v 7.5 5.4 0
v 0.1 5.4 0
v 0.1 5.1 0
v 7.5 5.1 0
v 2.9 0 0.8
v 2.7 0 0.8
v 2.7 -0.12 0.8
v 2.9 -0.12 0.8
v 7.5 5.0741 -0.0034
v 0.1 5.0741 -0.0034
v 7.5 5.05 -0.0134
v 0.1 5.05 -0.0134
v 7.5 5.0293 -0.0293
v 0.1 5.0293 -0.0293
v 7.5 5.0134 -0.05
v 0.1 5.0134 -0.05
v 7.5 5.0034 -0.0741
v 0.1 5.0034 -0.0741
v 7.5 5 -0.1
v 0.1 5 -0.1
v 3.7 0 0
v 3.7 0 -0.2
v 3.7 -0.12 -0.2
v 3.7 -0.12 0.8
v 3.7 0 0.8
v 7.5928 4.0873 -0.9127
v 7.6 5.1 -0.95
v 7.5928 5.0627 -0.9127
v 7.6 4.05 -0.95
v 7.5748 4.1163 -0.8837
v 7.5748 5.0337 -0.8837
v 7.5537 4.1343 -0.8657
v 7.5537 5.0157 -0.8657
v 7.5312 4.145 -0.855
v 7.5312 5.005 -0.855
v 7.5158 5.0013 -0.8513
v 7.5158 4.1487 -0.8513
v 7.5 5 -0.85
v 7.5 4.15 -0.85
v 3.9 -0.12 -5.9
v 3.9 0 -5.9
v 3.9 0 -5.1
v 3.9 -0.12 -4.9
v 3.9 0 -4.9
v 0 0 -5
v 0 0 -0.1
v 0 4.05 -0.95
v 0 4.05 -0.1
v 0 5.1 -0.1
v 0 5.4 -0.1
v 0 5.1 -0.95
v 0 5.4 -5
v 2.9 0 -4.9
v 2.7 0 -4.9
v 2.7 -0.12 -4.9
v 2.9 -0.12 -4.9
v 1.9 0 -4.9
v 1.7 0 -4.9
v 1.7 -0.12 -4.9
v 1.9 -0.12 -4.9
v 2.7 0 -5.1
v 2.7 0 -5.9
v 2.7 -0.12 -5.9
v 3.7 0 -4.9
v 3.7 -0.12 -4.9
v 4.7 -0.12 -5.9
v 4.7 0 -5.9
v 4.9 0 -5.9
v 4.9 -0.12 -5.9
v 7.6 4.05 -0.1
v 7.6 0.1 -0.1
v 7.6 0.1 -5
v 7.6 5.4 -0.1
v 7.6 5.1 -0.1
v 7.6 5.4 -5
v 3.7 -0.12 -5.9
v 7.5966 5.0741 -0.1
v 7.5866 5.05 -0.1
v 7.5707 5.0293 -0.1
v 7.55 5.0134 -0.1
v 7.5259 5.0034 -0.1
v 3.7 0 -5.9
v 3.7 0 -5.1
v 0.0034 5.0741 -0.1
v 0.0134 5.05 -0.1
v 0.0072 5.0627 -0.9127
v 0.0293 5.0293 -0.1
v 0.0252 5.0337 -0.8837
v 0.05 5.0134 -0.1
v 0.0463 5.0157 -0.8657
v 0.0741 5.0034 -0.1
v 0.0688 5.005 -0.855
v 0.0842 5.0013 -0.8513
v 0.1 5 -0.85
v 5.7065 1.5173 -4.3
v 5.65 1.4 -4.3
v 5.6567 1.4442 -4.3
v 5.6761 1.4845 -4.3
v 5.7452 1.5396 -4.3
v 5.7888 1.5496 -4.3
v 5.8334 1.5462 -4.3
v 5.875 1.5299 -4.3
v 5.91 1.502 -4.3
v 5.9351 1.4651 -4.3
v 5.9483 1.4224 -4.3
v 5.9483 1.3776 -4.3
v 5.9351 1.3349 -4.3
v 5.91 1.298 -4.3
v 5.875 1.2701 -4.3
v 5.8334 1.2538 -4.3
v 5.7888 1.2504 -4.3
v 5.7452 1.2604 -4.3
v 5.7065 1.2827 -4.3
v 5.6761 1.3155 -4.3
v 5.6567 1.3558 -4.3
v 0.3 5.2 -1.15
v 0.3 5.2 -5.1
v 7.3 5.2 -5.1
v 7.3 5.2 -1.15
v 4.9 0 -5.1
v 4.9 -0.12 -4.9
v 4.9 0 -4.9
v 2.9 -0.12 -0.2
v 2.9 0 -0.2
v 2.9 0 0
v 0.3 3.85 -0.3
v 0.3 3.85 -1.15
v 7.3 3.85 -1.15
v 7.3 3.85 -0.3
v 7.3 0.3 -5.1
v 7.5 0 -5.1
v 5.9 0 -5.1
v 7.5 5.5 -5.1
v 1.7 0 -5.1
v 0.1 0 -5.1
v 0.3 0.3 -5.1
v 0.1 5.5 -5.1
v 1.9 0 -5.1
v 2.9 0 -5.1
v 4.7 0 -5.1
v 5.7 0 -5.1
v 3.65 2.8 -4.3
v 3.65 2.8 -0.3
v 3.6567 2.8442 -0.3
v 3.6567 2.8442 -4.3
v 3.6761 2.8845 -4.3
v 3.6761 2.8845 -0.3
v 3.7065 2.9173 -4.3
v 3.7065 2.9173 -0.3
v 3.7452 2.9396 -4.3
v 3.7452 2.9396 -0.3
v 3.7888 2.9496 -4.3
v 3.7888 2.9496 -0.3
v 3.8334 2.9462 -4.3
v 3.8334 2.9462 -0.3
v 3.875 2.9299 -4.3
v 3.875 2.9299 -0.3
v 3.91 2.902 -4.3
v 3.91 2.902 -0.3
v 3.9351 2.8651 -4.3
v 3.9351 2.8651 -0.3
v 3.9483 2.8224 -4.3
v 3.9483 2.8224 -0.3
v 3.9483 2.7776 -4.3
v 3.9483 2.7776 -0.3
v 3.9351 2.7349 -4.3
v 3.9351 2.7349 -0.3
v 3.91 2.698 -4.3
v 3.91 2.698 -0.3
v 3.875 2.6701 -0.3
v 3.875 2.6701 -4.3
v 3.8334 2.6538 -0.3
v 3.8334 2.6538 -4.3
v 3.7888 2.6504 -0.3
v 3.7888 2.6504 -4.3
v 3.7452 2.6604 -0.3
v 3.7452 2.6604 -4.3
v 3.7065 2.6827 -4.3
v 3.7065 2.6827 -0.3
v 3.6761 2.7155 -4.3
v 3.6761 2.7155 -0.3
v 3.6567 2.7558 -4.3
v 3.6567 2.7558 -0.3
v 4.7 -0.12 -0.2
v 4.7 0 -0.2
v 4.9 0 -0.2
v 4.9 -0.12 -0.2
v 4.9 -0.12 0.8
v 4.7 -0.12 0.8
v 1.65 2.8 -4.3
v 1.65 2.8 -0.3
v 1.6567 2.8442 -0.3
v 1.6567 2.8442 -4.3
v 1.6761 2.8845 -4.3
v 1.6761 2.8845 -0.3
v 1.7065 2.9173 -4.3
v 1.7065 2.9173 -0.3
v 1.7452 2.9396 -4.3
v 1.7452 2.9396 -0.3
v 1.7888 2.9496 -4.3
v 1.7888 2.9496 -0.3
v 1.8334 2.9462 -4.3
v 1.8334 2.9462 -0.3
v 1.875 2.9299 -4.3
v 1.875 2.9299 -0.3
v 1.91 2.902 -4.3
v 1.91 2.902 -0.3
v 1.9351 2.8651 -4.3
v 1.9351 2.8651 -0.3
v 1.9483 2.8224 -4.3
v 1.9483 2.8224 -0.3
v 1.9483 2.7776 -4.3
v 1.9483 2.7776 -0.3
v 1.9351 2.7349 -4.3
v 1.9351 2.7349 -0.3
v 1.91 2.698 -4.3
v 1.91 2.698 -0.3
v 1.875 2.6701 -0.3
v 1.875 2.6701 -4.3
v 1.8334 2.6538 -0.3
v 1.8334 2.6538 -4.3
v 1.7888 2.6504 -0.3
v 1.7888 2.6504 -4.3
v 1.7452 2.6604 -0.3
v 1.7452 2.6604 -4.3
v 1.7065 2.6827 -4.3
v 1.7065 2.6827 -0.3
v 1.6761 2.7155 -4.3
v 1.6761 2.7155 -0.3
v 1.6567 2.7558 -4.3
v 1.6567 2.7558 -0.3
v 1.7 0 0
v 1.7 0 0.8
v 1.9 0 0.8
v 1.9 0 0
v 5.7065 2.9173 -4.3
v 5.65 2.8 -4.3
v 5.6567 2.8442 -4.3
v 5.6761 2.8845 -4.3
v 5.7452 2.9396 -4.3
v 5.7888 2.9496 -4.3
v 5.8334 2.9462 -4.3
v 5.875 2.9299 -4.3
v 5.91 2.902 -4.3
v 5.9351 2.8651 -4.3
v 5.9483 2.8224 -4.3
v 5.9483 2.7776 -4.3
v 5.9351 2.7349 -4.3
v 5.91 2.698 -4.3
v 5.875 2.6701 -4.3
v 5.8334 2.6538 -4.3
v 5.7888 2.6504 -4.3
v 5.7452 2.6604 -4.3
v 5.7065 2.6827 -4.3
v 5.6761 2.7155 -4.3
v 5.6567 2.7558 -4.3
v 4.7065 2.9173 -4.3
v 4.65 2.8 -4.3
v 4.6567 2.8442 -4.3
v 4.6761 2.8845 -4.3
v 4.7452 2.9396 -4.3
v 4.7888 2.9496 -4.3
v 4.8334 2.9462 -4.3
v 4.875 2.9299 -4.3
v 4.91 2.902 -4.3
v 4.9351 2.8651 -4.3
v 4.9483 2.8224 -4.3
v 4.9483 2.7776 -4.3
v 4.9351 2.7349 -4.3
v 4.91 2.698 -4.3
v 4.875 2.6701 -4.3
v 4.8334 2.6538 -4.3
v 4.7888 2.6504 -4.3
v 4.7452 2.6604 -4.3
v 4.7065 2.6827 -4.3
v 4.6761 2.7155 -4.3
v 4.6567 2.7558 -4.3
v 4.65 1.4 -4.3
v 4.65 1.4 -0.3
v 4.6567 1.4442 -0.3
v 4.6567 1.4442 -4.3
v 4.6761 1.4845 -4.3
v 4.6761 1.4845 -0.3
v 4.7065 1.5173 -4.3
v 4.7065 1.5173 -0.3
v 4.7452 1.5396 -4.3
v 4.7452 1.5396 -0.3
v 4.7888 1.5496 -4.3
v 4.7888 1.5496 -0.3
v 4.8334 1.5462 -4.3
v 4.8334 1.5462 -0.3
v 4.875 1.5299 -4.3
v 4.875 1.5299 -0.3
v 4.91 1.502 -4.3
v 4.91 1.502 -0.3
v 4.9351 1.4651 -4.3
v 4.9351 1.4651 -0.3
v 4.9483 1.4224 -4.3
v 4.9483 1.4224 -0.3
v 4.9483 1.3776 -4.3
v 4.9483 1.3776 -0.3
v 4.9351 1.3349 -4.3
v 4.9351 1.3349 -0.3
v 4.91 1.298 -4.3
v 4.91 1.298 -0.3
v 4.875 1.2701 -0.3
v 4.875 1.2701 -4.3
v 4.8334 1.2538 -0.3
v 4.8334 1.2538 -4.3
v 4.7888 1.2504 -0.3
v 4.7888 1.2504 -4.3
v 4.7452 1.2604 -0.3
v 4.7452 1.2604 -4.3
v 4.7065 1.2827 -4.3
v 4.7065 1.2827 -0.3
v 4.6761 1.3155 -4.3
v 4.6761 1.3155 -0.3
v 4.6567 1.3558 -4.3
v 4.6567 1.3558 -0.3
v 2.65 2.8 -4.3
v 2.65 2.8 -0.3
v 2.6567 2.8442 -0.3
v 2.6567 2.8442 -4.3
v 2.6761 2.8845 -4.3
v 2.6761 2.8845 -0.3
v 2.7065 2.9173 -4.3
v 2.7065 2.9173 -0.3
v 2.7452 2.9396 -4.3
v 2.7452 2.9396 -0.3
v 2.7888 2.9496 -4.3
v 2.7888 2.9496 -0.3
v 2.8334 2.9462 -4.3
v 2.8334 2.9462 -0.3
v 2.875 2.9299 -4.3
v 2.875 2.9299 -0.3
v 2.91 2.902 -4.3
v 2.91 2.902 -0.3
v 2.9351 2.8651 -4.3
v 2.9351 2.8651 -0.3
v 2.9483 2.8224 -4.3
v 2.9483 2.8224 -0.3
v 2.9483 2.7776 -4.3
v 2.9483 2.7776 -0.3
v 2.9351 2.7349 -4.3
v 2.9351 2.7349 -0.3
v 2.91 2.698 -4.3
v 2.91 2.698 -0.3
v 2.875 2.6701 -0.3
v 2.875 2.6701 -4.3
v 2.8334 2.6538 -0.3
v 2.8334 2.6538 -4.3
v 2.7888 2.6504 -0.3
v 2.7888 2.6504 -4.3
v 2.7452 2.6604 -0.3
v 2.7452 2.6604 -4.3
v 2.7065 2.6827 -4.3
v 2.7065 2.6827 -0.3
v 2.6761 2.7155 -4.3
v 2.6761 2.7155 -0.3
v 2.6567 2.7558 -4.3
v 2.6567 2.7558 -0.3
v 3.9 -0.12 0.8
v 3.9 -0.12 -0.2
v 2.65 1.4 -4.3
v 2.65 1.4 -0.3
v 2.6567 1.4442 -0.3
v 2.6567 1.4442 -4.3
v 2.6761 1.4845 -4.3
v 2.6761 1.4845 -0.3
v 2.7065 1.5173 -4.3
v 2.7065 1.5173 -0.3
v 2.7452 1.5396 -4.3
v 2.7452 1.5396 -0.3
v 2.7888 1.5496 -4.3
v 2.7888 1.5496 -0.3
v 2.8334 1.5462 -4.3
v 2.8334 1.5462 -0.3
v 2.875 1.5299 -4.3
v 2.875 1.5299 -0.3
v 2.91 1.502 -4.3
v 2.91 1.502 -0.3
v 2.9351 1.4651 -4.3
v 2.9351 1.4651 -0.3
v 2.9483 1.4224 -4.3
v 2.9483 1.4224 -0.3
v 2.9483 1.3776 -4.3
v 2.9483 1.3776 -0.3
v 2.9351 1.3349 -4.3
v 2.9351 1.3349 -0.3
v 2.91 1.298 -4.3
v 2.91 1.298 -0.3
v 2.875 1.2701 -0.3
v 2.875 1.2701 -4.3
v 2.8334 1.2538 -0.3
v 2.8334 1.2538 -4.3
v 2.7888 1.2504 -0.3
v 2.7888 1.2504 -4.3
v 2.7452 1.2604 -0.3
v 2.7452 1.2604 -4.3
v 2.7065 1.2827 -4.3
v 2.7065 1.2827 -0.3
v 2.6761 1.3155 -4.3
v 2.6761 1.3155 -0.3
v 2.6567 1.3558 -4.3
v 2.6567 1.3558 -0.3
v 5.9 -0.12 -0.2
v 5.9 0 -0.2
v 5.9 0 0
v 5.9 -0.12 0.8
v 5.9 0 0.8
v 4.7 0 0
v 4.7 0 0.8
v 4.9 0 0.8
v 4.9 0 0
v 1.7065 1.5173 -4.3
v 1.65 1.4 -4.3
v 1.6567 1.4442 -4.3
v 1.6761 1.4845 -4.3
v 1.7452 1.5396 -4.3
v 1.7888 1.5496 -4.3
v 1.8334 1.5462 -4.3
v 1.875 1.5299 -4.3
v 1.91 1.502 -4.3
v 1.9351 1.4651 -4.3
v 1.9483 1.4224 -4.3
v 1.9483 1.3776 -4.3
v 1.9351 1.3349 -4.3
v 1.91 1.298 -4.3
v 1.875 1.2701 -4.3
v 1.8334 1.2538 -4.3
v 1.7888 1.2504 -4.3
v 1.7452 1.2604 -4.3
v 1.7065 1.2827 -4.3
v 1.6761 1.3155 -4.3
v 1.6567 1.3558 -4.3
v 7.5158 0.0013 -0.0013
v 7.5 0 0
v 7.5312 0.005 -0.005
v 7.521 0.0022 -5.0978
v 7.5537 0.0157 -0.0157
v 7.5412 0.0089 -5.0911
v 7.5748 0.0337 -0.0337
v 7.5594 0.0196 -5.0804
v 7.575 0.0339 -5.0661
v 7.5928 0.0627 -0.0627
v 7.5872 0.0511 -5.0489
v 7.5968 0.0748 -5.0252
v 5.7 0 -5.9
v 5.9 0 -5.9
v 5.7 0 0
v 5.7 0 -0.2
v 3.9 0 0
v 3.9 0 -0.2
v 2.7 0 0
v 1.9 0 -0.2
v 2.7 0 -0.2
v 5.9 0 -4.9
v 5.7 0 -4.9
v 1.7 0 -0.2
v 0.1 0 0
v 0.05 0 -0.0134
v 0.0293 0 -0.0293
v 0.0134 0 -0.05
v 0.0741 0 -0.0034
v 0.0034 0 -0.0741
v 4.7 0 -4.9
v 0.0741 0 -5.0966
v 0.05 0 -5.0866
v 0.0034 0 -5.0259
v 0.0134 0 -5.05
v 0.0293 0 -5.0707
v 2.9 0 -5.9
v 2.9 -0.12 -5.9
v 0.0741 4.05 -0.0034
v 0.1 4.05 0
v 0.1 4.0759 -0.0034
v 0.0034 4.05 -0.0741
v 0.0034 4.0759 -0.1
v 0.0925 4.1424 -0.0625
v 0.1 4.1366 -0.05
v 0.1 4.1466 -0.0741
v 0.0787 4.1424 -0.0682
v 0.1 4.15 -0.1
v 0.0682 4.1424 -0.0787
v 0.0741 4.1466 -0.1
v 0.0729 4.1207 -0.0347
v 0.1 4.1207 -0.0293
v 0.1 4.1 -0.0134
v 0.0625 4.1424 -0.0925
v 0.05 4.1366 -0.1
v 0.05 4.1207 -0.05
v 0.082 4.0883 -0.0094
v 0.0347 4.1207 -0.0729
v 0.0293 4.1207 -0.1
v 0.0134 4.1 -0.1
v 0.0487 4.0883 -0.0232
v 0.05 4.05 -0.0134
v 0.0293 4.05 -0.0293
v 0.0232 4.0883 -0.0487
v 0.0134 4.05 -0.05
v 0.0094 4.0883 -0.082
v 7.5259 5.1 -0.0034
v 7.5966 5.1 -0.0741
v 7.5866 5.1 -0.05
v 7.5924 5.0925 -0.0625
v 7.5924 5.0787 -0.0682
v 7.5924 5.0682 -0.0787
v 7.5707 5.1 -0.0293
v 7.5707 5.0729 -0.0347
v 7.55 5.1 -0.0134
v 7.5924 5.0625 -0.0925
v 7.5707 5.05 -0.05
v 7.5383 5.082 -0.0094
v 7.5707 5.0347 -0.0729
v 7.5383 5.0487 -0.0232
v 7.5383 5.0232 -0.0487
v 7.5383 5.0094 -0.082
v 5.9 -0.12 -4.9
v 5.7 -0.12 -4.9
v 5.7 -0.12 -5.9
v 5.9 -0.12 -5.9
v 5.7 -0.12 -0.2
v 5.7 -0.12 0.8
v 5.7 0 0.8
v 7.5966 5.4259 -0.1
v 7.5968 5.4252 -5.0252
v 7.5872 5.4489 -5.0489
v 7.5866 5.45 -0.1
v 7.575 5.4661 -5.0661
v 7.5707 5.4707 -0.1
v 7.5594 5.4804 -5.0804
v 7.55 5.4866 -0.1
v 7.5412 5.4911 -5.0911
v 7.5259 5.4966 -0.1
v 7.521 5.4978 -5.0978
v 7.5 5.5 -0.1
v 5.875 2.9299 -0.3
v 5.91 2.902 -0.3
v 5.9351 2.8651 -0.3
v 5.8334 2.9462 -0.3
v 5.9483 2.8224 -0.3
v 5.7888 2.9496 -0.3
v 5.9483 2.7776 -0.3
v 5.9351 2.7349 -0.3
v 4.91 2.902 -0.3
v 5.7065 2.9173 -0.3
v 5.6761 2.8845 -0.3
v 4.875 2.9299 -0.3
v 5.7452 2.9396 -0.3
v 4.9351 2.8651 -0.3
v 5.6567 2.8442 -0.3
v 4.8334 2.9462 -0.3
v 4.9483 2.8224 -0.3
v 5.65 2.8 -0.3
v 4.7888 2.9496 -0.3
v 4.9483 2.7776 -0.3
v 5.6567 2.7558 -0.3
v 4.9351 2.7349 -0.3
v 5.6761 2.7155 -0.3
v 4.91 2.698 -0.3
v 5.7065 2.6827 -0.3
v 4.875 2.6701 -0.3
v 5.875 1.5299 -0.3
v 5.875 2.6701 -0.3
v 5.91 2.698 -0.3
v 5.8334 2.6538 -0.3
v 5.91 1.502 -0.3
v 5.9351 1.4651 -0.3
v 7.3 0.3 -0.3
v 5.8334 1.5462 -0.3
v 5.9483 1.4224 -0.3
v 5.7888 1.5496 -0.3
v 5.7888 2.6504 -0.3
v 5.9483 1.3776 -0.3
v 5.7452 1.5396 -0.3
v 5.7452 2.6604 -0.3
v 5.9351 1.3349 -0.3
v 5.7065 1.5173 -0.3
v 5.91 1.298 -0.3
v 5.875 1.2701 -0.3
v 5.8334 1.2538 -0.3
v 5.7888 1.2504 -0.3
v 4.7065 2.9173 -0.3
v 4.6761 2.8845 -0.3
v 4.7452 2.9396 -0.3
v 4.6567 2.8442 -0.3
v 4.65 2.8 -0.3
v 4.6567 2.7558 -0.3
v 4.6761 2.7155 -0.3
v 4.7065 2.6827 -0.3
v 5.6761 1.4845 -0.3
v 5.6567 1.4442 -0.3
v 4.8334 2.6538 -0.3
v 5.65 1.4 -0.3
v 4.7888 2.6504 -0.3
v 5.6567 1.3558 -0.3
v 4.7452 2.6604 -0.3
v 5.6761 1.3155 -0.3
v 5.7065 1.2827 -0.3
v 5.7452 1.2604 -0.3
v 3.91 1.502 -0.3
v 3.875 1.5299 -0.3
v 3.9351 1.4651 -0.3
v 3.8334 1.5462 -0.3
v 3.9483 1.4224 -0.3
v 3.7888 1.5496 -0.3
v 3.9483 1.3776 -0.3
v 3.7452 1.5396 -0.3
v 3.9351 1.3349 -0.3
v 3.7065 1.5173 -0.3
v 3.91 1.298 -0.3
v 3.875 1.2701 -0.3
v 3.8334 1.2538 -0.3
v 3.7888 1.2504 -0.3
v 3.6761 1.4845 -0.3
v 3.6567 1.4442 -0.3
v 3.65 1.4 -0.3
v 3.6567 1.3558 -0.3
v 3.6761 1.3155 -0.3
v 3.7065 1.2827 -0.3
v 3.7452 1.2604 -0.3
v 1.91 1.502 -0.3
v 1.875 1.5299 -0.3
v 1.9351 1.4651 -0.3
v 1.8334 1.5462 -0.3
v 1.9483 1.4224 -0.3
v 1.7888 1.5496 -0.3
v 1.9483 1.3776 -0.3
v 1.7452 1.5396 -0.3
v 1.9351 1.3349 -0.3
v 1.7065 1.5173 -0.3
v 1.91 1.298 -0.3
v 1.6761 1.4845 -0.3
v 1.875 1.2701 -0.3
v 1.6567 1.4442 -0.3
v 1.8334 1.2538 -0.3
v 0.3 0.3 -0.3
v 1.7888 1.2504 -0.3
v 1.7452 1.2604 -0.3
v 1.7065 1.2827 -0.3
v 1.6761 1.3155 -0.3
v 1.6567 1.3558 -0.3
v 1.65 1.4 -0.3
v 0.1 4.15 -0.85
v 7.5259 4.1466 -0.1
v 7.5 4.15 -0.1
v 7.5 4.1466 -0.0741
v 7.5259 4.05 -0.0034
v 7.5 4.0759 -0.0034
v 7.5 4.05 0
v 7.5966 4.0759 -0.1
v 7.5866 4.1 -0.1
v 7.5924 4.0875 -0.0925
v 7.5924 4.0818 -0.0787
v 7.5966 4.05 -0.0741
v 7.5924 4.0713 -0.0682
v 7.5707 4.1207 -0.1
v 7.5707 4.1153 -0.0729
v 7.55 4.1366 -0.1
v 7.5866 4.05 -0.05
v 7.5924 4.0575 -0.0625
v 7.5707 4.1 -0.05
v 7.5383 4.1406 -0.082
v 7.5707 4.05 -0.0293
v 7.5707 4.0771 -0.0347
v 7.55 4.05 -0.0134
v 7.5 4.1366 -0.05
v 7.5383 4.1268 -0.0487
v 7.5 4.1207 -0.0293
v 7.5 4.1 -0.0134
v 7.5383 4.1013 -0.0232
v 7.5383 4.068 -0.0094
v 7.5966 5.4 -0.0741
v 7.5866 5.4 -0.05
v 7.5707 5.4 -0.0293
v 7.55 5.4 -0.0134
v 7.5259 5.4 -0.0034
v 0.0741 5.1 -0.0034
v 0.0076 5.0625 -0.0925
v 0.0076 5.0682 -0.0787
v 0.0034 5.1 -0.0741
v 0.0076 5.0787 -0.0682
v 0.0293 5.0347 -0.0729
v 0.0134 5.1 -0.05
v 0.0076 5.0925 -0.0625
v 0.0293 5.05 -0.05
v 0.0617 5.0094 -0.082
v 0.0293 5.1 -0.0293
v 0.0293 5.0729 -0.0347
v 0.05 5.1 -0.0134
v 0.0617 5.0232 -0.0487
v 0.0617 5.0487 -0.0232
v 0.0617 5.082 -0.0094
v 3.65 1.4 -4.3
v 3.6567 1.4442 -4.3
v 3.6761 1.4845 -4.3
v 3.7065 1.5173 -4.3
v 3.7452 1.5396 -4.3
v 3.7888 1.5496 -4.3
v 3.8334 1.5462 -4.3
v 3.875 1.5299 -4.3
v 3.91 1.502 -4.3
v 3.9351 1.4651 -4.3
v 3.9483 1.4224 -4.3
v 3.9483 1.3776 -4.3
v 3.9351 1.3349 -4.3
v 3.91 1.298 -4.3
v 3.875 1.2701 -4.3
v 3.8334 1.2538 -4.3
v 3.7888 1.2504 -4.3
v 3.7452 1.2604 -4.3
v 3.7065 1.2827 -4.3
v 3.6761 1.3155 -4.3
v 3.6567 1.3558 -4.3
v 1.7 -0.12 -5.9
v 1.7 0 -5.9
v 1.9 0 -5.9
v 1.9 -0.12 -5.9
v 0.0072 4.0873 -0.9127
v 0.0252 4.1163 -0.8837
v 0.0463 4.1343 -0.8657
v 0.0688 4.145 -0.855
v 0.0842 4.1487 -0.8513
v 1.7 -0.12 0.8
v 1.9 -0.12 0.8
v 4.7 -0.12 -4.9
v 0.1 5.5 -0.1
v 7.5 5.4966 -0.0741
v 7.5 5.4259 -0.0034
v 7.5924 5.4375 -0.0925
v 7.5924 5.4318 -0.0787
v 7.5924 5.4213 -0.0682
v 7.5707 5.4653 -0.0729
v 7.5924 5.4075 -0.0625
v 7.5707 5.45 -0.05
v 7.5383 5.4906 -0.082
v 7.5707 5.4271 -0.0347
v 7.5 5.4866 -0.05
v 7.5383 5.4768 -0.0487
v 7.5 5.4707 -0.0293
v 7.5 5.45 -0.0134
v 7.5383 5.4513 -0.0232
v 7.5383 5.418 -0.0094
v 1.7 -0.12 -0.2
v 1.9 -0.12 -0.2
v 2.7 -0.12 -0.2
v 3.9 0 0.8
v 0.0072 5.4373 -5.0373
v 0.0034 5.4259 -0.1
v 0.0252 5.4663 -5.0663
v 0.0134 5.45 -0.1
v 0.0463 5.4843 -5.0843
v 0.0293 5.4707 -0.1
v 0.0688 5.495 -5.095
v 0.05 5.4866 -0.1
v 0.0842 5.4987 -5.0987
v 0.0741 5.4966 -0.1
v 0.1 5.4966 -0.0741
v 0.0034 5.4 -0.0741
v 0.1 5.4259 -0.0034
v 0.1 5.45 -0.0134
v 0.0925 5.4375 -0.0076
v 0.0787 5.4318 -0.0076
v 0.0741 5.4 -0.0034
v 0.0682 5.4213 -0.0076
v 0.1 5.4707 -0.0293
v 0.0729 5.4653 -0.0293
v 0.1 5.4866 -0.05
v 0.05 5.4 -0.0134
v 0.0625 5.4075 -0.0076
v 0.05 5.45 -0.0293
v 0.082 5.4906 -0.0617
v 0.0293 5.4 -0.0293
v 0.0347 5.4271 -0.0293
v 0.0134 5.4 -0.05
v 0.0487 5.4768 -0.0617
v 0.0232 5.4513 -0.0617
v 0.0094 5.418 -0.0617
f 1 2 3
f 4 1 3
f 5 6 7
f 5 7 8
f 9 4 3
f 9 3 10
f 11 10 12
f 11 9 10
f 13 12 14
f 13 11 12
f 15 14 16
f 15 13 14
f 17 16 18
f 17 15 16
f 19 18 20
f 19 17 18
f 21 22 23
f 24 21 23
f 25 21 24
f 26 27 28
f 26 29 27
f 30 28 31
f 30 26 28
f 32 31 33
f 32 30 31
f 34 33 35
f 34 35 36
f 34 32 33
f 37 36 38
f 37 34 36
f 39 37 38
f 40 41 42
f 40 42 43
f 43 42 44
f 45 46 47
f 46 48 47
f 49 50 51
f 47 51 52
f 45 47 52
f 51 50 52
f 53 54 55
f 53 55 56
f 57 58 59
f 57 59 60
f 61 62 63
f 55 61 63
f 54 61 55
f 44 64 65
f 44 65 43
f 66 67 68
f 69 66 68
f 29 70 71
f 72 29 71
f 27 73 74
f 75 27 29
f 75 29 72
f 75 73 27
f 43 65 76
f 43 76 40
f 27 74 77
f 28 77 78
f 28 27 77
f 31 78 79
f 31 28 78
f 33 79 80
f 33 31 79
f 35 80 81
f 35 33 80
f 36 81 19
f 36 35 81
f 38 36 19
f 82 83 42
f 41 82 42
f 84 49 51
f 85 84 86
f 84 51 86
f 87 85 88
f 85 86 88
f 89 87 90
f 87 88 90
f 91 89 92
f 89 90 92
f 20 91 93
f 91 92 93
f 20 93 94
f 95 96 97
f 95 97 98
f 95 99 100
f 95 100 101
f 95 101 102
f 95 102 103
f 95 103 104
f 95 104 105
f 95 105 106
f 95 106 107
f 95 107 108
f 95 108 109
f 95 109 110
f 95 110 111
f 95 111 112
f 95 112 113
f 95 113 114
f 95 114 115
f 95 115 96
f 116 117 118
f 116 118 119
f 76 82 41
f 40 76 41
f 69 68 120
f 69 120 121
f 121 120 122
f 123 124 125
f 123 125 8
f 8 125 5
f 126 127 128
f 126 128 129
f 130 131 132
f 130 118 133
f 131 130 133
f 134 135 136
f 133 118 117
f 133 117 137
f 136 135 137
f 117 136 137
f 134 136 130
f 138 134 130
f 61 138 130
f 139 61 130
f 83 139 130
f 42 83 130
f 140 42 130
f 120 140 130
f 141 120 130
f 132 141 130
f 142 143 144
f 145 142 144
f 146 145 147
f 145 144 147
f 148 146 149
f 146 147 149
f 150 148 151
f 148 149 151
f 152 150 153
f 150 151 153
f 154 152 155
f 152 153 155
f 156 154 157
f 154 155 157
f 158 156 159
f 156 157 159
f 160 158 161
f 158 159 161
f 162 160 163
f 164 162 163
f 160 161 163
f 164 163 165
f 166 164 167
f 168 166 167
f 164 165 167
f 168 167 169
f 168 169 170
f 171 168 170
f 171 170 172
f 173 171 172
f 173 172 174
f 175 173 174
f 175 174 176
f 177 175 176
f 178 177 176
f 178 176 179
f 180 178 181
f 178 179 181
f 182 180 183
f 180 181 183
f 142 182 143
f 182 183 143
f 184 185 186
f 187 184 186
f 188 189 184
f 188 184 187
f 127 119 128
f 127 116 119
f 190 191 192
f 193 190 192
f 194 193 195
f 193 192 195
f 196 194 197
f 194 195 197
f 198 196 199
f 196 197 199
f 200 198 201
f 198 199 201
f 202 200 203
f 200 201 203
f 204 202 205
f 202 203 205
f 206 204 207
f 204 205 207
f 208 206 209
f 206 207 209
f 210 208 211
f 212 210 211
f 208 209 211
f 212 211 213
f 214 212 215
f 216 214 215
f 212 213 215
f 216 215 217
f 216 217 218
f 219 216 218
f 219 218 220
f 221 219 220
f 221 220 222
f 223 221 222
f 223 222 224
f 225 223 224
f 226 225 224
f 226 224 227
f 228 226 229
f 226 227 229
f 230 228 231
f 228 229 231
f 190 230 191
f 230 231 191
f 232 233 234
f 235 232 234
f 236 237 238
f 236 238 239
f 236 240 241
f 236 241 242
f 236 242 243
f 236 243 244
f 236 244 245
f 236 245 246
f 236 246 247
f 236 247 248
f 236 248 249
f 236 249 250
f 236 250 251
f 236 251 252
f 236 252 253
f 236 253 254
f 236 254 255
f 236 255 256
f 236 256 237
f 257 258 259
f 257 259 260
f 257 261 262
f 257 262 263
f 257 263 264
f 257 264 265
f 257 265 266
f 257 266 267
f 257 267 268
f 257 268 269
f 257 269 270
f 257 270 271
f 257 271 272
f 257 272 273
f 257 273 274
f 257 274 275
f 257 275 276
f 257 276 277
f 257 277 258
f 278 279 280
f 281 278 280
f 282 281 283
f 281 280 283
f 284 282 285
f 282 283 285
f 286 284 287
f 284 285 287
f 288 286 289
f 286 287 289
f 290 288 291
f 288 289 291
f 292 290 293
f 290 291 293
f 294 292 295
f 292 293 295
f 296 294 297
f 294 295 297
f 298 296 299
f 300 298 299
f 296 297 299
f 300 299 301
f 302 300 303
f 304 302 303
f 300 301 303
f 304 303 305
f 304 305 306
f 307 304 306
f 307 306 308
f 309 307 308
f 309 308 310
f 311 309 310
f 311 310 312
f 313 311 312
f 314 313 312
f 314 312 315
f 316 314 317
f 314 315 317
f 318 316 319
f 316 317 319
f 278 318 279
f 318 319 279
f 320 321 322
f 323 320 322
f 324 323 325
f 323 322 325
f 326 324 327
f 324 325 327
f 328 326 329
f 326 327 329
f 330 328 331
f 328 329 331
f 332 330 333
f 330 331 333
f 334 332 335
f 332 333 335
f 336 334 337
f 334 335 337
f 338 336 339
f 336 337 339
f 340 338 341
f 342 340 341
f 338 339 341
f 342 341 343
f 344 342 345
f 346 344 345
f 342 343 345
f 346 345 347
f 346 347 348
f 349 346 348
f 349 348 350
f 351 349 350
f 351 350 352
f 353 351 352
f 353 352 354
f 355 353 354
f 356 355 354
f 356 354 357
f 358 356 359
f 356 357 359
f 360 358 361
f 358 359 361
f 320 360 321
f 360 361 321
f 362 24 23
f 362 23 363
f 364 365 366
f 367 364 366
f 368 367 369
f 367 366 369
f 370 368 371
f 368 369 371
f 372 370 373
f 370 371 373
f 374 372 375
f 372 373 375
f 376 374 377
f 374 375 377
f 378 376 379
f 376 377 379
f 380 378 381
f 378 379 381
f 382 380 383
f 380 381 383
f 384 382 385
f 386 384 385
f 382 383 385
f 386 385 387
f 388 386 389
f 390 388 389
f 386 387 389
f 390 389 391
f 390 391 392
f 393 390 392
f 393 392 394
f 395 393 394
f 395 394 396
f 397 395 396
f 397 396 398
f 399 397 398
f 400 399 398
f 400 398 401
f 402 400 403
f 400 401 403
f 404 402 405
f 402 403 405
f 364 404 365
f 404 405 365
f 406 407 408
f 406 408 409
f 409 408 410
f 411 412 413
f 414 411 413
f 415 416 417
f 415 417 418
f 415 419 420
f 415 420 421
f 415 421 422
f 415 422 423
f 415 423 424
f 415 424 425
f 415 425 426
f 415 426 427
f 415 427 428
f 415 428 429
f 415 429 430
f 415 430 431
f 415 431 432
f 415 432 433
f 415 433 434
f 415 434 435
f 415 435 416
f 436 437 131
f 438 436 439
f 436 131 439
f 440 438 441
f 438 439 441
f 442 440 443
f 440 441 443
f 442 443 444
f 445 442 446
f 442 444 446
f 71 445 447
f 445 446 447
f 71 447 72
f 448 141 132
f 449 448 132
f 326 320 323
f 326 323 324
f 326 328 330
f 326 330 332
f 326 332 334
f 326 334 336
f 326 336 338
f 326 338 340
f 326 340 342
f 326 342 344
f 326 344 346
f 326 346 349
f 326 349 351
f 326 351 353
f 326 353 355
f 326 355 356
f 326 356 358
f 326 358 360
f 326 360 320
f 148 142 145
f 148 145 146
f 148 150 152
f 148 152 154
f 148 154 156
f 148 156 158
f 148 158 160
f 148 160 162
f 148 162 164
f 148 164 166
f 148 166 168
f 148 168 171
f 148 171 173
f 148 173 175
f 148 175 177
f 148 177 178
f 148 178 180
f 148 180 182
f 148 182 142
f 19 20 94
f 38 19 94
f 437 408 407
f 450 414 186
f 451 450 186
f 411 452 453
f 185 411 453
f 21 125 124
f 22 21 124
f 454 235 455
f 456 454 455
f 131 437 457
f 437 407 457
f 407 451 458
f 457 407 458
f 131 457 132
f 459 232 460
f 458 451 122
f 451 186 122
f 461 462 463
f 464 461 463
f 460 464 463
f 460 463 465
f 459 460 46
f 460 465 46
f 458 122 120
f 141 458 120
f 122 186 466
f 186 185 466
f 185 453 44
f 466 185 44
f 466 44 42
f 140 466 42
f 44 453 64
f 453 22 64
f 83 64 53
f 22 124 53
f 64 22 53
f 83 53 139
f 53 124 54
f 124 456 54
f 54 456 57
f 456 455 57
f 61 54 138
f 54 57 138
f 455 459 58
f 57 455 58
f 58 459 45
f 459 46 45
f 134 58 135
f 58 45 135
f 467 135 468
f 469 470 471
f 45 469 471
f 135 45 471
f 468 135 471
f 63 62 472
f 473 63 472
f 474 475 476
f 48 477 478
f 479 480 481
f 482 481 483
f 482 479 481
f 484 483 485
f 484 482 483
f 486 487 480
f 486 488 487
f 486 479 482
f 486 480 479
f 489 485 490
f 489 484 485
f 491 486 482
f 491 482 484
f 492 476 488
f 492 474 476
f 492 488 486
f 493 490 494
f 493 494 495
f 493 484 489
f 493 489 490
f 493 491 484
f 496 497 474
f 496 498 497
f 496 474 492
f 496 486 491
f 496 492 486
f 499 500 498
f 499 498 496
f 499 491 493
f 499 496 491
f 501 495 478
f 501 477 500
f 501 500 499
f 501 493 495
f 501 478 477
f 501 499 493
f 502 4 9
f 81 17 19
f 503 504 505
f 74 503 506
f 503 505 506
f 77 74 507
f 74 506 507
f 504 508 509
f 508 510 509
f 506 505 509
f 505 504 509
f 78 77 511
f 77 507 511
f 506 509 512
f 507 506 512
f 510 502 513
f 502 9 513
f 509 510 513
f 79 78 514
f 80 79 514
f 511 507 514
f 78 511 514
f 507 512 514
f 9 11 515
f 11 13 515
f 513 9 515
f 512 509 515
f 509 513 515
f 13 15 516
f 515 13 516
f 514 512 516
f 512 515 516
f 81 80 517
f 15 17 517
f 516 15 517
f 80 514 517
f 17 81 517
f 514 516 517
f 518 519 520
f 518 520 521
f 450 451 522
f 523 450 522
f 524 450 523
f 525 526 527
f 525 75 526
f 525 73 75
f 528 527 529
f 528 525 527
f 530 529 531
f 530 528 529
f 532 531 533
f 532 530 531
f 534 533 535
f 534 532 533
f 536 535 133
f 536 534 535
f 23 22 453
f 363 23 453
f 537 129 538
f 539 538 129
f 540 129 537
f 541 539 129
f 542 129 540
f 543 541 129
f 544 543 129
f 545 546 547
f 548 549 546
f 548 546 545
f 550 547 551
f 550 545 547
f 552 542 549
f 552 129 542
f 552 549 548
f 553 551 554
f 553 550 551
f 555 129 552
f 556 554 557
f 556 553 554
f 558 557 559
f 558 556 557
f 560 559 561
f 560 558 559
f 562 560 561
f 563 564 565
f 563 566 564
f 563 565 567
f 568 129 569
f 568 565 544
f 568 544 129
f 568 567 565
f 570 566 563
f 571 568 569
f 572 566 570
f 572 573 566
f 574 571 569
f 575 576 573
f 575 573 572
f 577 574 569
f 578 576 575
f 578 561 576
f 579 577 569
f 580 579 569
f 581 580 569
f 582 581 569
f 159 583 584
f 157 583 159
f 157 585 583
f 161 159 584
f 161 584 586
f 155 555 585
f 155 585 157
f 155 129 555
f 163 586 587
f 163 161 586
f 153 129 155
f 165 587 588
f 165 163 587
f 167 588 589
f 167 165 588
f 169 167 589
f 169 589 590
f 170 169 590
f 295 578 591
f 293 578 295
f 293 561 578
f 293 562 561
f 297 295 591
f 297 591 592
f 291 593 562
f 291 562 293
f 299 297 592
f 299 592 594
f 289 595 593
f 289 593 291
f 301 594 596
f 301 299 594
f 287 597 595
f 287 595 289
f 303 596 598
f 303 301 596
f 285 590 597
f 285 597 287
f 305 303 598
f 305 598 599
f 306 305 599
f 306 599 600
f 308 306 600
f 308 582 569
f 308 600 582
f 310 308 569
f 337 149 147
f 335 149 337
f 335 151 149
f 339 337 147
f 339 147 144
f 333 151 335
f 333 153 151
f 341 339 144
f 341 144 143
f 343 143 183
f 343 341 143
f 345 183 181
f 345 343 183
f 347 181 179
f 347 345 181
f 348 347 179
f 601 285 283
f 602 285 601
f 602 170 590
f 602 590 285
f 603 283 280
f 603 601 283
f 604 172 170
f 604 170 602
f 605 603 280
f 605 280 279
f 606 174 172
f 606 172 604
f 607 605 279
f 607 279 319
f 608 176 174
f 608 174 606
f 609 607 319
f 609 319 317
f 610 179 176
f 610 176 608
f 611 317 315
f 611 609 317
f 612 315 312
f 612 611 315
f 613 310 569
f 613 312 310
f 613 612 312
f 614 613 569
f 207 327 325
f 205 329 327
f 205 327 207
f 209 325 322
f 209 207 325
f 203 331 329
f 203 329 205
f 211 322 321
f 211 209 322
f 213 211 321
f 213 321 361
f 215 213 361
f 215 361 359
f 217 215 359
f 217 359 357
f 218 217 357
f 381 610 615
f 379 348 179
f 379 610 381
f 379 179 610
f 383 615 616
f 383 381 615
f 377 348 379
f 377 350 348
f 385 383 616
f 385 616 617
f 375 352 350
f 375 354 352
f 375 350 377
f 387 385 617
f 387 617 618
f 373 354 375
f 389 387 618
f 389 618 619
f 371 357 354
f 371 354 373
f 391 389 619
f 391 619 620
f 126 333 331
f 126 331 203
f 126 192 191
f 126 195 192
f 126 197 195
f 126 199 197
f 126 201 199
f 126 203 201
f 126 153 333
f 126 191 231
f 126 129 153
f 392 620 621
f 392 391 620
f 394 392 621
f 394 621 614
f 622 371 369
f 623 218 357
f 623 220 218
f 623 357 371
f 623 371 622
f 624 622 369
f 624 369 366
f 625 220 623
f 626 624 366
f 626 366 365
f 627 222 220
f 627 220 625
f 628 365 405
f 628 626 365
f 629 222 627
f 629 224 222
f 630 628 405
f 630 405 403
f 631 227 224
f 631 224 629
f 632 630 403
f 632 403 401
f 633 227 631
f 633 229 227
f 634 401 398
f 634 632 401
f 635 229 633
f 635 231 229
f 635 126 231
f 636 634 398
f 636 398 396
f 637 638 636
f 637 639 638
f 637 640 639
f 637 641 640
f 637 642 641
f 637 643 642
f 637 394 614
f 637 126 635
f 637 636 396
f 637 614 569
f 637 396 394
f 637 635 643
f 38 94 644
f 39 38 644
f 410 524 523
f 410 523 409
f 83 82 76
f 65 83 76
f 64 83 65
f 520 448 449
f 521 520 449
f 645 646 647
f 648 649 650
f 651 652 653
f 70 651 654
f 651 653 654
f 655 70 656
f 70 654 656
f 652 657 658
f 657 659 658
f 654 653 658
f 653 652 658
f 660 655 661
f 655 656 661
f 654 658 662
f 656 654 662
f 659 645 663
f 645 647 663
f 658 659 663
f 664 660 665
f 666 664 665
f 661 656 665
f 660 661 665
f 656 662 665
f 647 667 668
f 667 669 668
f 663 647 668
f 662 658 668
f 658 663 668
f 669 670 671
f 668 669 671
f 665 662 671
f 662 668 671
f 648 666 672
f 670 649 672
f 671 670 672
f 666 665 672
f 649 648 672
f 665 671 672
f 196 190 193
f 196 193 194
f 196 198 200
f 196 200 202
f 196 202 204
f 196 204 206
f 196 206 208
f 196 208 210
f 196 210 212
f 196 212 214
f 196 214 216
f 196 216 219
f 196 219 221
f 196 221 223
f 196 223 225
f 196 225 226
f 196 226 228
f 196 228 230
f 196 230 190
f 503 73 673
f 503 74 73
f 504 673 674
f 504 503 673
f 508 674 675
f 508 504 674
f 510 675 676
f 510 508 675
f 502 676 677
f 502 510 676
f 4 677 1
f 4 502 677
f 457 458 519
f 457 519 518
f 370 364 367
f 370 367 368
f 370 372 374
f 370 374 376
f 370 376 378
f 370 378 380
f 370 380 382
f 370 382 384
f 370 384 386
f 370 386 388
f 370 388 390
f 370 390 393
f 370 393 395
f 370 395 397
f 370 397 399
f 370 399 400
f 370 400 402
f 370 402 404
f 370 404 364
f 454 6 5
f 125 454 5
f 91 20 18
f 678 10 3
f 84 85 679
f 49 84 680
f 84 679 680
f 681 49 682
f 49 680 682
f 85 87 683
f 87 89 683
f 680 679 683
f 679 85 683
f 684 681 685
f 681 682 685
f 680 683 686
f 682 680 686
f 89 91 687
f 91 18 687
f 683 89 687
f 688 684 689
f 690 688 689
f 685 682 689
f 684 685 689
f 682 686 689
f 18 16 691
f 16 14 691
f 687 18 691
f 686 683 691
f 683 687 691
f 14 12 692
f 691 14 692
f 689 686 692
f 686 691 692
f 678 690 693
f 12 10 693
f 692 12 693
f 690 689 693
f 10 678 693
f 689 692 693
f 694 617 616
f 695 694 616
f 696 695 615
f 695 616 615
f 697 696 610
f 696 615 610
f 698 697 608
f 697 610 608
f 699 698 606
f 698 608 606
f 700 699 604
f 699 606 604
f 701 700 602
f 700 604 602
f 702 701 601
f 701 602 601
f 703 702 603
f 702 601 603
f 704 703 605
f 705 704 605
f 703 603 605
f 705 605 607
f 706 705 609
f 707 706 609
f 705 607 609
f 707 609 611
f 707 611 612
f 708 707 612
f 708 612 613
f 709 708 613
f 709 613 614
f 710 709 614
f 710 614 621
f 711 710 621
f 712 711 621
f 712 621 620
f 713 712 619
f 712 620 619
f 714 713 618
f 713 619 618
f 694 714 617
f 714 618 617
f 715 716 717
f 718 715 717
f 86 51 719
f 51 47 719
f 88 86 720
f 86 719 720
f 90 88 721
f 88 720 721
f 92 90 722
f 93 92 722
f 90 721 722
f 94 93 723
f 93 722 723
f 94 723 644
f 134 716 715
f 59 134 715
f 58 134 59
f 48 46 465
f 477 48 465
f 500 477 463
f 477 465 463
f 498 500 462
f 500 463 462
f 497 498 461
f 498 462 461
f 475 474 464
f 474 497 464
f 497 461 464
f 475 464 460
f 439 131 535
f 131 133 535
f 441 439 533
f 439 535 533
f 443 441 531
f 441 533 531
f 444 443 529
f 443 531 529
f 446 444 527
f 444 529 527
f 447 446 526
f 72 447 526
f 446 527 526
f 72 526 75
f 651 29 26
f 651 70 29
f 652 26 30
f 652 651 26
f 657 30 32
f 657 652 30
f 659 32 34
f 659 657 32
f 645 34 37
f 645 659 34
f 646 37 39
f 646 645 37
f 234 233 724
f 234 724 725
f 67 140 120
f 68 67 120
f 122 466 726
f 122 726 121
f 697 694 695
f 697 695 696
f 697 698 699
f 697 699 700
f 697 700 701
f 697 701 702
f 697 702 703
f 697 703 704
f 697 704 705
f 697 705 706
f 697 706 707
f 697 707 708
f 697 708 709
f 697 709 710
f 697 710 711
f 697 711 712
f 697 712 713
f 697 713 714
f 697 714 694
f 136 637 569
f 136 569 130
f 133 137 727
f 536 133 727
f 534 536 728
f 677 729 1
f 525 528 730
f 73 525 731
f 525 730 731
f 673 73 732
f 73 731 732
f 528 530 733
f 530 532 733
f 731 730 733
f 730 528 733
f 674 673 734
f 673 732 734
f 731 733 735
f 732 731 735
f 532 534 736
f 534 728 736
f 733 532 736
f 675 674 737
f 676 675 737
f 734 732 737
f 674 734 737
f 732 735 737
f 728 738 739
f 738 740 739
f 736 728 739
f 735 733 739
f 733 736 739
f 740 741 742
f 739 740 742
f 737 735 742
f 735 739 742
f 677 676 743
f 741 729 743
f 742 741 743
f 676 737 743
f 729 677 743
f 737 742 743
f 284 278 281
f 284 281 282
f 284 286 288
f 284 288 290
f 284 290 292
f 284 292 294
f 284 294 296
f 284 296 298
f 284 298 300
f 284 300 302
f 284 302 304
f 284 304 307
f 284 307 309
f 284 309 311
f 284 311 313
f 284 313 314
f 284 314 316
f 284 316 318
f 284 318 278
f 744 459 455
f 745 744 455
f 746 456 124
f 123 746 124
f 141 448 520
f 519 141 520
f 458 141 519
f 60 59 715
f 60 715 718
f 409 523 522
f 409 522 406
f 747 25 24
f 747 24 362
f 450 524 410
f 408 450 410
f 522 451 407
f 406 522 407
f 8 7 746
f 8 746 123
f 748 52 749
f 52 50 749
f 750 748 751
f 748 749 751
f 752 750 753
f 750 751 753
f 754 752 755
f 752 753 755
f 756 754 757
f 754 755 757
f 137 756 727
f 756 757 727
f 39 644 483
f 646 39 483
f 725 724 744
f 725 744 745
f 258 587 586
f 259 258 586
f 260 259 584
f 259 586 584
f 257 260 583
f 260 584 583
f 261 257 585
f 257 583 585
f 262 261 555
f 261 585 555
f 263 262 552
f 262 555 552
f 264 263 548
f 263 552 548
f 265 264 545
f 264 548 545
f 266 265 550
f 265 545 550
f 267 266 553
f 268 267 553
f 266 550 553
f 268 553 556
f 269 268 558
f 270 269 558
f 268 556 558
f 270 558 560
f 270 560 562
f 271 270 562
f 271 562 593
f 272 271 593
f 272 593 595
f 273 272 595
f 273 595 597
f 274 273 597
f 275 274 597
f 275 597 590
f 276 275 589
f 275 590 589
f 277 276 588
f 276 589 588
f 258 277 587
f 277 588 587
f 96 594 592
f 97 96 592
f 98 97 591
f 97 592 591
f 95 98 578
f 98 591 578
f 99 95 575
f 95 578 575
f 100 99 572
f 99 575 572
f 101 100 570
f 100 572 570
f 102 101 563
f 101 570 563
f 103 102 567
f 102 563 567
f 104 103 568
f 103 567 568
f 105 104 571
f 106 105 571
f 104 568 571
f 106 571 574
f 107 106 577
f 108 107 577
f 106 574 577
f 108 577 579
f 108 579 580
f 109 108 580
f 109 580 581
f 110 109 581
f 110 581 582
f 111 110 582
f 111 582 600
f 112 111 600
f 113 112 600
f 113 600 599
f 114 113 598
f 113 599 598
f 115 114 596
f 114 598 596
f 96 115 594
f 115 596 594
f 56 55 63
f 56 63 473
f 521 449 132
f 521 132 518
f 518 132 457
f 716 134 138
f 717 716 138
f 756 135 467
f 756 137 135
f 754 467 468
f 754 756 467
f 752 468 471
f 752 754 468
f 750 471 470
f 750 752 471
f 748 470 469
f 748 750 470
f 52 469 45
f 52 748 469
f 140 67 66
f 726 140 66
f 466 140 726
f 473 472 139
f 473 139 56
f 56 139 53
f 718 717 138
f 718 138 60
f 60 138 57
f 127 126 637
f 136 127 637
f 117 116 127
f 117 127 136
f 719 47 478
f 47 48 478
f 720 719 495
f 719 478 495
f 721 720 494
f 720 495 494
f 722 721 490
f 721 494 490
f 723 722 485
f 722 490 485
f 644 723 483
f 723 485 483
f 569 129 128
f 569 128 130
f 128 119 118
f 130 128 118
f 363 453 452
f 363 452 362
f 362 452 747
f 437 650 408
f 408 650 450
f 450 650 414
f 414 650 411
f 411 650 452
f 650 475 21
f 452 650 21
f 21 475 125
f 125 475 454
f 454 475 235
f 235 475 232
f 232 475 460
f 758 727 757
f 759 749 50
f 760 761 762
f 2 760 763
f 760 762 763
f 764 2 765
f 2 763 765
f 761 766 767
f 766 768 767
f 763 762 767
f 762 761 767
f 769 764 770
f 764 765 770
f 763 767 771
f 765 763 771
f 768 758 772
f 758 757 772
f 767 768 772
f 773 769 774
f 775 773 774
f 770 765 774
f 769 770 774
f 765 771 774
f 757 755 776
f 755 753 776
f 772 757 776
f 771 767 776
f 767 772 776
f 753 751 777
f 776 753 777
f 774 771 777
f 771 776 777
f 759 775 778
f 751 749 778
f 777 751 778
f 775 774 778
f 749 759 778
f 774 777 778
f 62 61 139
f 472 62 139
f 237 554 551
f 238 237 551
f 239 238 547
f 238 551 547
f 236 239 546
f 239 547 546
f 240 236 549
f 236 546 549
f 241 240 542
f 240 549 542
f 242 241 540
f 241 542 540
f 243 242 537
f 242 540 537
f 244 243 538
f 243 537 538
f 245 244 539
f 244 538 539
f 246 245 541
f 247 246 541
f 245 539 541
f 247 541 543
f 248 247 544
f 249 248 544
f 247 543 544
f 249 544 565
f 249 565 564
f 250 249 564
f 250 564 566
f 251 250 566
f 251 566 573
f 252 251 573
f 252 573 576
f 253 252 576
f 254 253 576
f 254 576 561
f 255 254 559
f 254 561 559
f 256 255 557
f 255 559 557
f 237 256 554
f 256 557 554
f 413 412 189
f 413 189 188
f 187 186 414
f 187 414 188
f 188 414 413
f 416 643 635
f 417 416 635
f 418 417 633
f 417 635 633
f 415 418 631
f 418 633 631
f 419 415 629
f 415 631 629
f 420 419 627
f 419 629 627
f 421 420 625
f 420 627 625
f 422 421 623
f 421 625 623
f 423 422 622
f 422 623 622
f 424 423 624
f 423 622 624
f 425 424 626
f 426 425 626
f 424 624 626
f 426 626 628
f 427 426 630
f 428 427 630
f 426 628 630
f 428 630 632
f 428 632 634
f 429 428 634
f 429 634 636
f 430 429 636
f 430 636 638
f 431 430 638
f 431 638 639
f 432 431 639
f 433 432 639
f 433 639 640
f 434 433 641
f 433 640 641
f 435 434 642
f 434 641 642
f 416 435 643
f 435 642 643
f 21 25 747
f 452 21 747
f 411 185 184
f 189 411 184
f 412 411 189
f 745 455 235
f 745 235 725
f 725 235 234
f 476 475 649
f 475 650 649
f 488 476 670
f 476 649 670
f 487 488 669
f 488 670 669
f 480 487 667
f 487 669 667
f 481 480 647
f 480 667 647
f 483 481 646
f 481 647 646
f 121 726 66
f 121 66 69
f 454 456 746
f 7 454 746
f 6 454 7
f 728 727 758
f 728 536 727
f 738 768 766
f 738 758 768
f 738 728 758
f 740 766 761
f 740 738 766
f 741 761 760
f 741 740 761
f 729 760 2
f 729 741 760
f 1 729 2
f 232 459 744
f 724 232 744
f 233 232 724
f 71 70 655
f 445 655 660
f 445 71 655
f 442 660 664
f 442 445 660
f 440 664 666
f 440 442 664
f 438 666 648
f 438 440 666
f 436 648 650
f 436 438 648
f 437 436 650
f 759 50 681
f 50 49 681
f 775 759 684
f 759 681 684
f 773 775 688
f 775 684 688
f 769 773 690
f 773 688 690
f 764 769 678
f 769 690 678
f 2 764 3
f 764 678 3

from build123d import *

# Parameters (mm, degrees)
EXTRUDE_1_DEPTH = 7.6
SHELL_1_T       = -0.3
SKETCH_2_W      = 0.2
SKETCH_2_H      = 1
EXTRUDE_2_DEPTH = 0.12
SKETCH_3_R      = 0.15
EXTRUDE_3_DEPTH = 4
FILLET_2_R      = 0.1


with BuildPart() as part:
    # 草图1 → 凸台-拉伸1 (new body)
    with BuildSketch(Plane(origin=(0, 0, 0), x_dir=(0, 0, -1), z_dir=(1, 0, 0))):
        Polygon((0, 0), (5.1, 0), (5.1, 5.5), (0, 5.5), (0, 5), (0.85, 5), (0.85, 4.15), (0, 4.15), align=None)
    extrude(amount=EXTRUDE_1_DEPTH)

    # 抽壳1
    shell_1_openings = [part.faces().sort_by_distance(p)[0] for p in [
        (3.8, 2.75, -5.1),
    ]]
    offset(amount=SHELL_1_T, openings=shell_1_openings, kind=Kind.INTERSECTION)

    # 草图2 → 凸台-拉伸2 (add)
    with BuildSketch(Plane.XZ):
        with Locations((2.8, -5.4)):
            Rectangle(SKETCH_2_W, SKETCH_2_H)
        with Locations((1.8, -5.4)):
            Rectangle(SKETCH_2_W, SKETCH_2_H)
        with Locations((3.8, -5.4)):
            Rectangle(SKETCH_2_W, SKETCH_2_H)
        with Locations((4.8, -5.4)):
            Rectangle(SKETCH_2_W, SKETCH_2_H)
        with Locations((5.8, -5.4)):
            Rectangle(SKETCH_2_W, SKETCH_2_H)
        with Locations((5.8, 0.3)):
            Rectangle(SKETCH_2_W, SKETCH_2_H)
        with Locations((4.8, 0.3)):
            Rectangle(SKETCH_2_W, SKETCH_2_H)
        with Locations((3.8, 0.3)):
            Rectangle(SKETCH_2_W, SKETCH_2_H)
        with Locations((2.8, 0.3)):
            Rectangle(SKETCH_2_W, SKETCH_2_H)
        with Locations((1.8, 0.3)):
            Rectangle(SKETCH_2_W, SKETCH_2_H)
    extrude(amount=EXTRUDE_2_DEPTH)

    # 草图3 → 凸台-拉伸3 (add)
    with BuildSketch(Plane(origin=(0, 0, -0.3), x_dir=(-1, 0, 0), z_dir=(0, 0, -1))):
        with Locations((-5.8, 1.4)):
            Circle(SKETCH_3_R)
        with Locations((-4.8, 1.4)):
            Circle(SKETCH_3_R)
        with Locations((-3.8, 1.4)):
            Circle(SKETCH_3_R)
        with Locations((-2.8, 1.4)):
            Circle(SKETCH_3_R)
        with Locations((-1.8, 1.4)):
            Circle(SKETCH_3_R)
        with Locations((-1.8, 2.8)):
            Circle(SKETCH_3_R)
        with Locations((-2.8, 2.8)):
            Circle(SKETCH_3_R)
        with Locations((-3.8, 2.8)):
            Circle(SKETCH_3_R)
        with Locations((-4.8, 2.8)):
            Circle(SKETCH_3_R)
        with Locations((-5.8, 2.8)):
            Circle(SKETCH_3_R)
    extrude(amount=EXTRUDE_3_DEPTH)

    # 圆角2
    fillet_2_edges = [part.edges().sort_by_distance(p)[0] for p in [
        (0, 5.5, -2.55),
        (0, 2.75, -5.1),
        (0, 2.075, 0),
        (7.6, 2.75, -5.1),
        (3.8, 4.15, 0),
        (3.8, 5, 0),
        (3.8, 5.5, 0),
        (7.6, 5.5, -2.55),
        (7.6, 5.25, 0),
        (7.6, 5, -0.425),
        (7.6, 4.575, -0.85),
        (7.6, 4.15, -0.425),
        (7.6, 2.075, 0),
        (0, 4.15, -0.425),
        (7.6, 0, -2.55),
        (0, 4.575, -0.85),
        (0, 5, -0.425),
        (0, 5.25, 0),
    ]]
    fillet(fillet_2_edges, radius=FILLET_2_R)


solid = part.part
